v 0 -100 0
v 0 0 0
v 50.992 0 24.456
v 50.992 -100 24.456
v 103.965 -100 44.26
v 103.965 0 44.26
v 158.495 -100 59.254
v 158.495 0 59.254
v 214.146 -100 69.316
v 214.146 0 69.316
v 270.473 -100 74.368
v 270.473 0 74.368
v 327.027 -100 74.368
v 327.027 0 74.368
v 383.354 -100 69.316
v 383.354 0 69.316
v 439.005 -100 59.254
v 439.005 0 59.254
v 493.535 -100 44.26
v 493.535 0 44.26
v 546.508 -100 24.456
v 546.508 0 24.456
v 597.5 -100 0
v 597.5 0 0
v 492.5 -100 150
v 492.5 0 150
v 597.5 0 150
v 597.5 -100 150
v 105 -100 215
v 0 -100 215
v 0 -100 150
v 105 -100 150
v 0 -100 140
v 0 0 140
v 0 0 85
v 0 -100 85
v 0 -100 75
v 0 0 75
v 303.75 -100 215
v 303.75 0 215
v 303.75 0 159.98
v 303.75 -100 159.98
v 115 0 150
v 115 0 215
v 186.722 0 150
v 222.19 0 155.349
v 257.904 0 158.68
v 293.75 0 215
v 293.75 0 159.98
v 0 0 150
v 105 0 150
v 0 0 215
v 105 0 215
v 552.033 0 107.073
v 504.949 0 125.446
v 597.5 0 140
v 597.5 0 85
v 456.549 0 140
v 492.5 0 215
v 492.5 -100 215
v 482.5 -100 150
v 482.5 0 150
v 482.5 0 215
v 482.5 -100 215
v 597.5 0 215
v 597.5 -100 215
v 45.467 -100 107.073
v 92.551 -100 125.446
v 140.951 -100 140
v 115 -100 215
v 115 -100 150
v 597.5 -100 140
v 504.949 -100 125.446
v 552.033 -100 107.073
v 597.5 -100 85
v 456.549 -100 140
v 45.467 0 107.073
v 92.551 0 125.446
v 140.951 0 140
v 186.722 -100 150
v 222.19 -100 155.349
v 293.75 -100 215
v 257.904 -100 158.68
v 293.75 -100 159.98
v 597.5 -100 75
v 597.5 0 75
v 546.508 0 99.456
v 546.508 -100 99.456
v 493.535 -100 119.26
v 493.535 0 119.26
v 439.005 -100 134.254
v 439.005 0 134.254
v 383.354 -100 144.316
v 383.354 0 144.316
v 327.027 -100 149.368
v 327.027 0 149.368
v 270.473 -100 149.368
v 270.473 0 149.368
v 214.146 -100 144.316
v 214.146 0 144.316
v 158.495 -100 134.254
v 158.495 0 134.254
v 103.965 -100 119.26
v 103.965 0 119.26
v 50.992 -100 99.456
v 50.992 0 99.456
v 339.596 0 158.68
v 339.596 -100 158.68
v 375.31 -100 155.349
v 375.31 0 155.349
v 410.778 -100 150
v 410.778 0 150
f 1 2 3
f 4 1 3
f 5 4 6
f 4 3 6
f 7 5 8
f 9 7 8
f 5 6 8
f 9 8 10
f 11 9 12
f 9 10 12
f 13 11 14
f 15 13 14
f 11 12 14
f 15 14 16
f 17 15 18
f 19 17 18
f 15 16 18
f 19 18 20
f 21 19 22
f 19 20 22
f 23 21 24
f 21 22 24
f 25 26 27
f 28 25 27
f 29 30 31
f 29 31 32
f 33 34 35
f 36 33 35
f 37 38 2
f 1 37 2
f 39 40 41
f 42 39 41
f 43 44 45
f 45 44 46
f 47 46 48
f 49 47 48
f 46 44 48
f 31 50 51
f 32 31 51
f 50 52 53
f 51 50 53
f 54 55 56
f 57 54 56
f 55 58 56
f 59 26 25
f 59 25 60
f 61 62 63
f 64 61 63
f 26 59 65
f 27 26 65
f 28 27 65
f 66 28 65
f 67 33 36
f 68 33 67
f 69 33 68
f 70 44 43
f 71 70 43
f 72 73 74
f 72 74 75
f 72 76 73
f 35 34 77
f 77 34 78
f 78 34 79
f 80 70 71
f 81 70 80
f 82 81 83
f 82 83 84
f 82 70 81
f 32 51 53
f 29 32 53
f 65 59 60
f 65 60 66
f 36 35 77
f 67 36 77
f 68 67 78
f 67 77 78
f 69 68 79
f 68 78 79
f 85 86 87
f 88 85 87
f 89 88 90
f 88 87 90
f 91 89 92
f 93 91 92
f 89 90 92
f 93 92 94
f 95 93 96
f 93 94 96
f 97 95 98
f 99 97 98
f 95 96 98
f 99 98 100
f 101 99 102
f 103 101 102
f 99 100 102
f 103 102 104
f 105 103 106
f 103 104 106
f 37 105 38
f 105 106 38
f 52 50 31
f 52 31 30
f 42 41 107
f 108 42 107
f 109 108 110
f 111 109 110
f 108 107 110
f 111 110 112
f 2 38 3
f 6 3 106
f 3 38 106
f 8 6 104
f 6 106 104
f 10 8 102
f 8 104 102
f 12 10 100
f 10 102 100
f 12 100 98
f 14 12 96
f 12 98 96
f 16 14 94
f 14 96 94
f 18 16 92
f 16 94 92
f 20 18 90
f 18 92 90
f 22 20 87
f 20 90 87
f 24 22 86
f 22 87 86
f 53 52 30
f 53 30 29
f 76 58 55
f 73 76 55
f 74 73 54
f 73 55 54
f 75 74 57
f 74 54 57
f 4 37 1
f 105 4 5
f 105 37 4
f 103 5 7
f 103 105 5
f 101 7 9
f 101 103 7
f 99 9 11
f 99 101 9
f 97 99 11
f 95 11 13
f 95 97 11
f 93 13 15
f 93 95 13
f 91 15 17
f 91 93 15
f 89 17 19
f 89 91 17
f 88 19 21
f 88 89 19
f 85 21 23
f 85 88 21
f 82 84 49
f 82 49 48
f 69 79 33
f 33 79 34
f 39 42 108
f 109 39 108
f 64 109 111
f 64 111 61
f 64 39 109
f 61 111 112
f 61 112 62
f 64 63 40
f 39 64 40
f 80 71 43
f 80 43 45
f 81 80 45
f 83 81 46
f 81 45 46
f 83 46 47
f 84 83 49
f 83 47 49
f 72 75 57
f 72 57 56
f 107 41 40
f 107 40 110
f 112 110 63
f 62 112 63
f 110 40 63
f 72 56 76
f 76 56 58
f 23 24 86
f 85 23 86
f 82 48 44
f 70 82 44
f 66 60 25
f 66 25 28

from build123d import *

# Parameters (mm, degrees)
F0_W     = 105
F0_H     = 65
F1_DEPTH = 100


with BuildPart() as f1:
    # F0 (on Front) → F1 (new body)
    with BuildSketch(Plane.XZ):
        with Locations((52.5, 182.5)):
            Rectangle(F0_W, F0_H)
        with BuildLine():
            Line((115, 150), (186.722288, 150))
            ThreePointArc((186.722288, 150), (240.023748, 157.267842), (293.75, 159.980237))
            Line((293.75, 159.980237), (293.75, 215))
            Line((293.75, 215), (115, 215))
            Line((115, 215), (115, 150))
        make_face()
        with BuildLine():
            ThreePointArc((303.75, 159.980237), (357.476252, 157.267842), (410.777712, 150))
            Line((410.777712, 150), (482.5, 150))
            Line((482.5, 150), (482.5, 215))
            Line((482.5, 215), (303.75, 215))
            Line((303.75, 215), (303.75, 159.980237))
        make_face()
        with Locations((545, 182.5)):
            Rectangle(F0_W, F0_H)
        with BuildLine():
            ThreePointArc((456.548659, 140), (528.674813, 116.729779), (597.5, 85))
            Line((597.5, 85), (597.5, 140))
            Line((597.5, 140), (456.548659, 140))
        make_face()
        with BuildLine():
            Line((0, 75), (0, 0))
            ThreePointArc((0, 0), (298.75, 75), (597.5, 0))
            Line((597.5, 0), (597.5, 75))
            ThreePointArc((597.5, 75), (298.75, 150), (0, 75))
        make_face()
        with BuildLine():
            Line((0, 140), (0, 85))
            ThreePointArc((0, 85), (68.825187, 116.729779), (140.951341, 140))
            Line((140.951341, 140), (0, 140))
        make_face()
    extrude(amount=F1_DEPTH)


solid = f1.part
